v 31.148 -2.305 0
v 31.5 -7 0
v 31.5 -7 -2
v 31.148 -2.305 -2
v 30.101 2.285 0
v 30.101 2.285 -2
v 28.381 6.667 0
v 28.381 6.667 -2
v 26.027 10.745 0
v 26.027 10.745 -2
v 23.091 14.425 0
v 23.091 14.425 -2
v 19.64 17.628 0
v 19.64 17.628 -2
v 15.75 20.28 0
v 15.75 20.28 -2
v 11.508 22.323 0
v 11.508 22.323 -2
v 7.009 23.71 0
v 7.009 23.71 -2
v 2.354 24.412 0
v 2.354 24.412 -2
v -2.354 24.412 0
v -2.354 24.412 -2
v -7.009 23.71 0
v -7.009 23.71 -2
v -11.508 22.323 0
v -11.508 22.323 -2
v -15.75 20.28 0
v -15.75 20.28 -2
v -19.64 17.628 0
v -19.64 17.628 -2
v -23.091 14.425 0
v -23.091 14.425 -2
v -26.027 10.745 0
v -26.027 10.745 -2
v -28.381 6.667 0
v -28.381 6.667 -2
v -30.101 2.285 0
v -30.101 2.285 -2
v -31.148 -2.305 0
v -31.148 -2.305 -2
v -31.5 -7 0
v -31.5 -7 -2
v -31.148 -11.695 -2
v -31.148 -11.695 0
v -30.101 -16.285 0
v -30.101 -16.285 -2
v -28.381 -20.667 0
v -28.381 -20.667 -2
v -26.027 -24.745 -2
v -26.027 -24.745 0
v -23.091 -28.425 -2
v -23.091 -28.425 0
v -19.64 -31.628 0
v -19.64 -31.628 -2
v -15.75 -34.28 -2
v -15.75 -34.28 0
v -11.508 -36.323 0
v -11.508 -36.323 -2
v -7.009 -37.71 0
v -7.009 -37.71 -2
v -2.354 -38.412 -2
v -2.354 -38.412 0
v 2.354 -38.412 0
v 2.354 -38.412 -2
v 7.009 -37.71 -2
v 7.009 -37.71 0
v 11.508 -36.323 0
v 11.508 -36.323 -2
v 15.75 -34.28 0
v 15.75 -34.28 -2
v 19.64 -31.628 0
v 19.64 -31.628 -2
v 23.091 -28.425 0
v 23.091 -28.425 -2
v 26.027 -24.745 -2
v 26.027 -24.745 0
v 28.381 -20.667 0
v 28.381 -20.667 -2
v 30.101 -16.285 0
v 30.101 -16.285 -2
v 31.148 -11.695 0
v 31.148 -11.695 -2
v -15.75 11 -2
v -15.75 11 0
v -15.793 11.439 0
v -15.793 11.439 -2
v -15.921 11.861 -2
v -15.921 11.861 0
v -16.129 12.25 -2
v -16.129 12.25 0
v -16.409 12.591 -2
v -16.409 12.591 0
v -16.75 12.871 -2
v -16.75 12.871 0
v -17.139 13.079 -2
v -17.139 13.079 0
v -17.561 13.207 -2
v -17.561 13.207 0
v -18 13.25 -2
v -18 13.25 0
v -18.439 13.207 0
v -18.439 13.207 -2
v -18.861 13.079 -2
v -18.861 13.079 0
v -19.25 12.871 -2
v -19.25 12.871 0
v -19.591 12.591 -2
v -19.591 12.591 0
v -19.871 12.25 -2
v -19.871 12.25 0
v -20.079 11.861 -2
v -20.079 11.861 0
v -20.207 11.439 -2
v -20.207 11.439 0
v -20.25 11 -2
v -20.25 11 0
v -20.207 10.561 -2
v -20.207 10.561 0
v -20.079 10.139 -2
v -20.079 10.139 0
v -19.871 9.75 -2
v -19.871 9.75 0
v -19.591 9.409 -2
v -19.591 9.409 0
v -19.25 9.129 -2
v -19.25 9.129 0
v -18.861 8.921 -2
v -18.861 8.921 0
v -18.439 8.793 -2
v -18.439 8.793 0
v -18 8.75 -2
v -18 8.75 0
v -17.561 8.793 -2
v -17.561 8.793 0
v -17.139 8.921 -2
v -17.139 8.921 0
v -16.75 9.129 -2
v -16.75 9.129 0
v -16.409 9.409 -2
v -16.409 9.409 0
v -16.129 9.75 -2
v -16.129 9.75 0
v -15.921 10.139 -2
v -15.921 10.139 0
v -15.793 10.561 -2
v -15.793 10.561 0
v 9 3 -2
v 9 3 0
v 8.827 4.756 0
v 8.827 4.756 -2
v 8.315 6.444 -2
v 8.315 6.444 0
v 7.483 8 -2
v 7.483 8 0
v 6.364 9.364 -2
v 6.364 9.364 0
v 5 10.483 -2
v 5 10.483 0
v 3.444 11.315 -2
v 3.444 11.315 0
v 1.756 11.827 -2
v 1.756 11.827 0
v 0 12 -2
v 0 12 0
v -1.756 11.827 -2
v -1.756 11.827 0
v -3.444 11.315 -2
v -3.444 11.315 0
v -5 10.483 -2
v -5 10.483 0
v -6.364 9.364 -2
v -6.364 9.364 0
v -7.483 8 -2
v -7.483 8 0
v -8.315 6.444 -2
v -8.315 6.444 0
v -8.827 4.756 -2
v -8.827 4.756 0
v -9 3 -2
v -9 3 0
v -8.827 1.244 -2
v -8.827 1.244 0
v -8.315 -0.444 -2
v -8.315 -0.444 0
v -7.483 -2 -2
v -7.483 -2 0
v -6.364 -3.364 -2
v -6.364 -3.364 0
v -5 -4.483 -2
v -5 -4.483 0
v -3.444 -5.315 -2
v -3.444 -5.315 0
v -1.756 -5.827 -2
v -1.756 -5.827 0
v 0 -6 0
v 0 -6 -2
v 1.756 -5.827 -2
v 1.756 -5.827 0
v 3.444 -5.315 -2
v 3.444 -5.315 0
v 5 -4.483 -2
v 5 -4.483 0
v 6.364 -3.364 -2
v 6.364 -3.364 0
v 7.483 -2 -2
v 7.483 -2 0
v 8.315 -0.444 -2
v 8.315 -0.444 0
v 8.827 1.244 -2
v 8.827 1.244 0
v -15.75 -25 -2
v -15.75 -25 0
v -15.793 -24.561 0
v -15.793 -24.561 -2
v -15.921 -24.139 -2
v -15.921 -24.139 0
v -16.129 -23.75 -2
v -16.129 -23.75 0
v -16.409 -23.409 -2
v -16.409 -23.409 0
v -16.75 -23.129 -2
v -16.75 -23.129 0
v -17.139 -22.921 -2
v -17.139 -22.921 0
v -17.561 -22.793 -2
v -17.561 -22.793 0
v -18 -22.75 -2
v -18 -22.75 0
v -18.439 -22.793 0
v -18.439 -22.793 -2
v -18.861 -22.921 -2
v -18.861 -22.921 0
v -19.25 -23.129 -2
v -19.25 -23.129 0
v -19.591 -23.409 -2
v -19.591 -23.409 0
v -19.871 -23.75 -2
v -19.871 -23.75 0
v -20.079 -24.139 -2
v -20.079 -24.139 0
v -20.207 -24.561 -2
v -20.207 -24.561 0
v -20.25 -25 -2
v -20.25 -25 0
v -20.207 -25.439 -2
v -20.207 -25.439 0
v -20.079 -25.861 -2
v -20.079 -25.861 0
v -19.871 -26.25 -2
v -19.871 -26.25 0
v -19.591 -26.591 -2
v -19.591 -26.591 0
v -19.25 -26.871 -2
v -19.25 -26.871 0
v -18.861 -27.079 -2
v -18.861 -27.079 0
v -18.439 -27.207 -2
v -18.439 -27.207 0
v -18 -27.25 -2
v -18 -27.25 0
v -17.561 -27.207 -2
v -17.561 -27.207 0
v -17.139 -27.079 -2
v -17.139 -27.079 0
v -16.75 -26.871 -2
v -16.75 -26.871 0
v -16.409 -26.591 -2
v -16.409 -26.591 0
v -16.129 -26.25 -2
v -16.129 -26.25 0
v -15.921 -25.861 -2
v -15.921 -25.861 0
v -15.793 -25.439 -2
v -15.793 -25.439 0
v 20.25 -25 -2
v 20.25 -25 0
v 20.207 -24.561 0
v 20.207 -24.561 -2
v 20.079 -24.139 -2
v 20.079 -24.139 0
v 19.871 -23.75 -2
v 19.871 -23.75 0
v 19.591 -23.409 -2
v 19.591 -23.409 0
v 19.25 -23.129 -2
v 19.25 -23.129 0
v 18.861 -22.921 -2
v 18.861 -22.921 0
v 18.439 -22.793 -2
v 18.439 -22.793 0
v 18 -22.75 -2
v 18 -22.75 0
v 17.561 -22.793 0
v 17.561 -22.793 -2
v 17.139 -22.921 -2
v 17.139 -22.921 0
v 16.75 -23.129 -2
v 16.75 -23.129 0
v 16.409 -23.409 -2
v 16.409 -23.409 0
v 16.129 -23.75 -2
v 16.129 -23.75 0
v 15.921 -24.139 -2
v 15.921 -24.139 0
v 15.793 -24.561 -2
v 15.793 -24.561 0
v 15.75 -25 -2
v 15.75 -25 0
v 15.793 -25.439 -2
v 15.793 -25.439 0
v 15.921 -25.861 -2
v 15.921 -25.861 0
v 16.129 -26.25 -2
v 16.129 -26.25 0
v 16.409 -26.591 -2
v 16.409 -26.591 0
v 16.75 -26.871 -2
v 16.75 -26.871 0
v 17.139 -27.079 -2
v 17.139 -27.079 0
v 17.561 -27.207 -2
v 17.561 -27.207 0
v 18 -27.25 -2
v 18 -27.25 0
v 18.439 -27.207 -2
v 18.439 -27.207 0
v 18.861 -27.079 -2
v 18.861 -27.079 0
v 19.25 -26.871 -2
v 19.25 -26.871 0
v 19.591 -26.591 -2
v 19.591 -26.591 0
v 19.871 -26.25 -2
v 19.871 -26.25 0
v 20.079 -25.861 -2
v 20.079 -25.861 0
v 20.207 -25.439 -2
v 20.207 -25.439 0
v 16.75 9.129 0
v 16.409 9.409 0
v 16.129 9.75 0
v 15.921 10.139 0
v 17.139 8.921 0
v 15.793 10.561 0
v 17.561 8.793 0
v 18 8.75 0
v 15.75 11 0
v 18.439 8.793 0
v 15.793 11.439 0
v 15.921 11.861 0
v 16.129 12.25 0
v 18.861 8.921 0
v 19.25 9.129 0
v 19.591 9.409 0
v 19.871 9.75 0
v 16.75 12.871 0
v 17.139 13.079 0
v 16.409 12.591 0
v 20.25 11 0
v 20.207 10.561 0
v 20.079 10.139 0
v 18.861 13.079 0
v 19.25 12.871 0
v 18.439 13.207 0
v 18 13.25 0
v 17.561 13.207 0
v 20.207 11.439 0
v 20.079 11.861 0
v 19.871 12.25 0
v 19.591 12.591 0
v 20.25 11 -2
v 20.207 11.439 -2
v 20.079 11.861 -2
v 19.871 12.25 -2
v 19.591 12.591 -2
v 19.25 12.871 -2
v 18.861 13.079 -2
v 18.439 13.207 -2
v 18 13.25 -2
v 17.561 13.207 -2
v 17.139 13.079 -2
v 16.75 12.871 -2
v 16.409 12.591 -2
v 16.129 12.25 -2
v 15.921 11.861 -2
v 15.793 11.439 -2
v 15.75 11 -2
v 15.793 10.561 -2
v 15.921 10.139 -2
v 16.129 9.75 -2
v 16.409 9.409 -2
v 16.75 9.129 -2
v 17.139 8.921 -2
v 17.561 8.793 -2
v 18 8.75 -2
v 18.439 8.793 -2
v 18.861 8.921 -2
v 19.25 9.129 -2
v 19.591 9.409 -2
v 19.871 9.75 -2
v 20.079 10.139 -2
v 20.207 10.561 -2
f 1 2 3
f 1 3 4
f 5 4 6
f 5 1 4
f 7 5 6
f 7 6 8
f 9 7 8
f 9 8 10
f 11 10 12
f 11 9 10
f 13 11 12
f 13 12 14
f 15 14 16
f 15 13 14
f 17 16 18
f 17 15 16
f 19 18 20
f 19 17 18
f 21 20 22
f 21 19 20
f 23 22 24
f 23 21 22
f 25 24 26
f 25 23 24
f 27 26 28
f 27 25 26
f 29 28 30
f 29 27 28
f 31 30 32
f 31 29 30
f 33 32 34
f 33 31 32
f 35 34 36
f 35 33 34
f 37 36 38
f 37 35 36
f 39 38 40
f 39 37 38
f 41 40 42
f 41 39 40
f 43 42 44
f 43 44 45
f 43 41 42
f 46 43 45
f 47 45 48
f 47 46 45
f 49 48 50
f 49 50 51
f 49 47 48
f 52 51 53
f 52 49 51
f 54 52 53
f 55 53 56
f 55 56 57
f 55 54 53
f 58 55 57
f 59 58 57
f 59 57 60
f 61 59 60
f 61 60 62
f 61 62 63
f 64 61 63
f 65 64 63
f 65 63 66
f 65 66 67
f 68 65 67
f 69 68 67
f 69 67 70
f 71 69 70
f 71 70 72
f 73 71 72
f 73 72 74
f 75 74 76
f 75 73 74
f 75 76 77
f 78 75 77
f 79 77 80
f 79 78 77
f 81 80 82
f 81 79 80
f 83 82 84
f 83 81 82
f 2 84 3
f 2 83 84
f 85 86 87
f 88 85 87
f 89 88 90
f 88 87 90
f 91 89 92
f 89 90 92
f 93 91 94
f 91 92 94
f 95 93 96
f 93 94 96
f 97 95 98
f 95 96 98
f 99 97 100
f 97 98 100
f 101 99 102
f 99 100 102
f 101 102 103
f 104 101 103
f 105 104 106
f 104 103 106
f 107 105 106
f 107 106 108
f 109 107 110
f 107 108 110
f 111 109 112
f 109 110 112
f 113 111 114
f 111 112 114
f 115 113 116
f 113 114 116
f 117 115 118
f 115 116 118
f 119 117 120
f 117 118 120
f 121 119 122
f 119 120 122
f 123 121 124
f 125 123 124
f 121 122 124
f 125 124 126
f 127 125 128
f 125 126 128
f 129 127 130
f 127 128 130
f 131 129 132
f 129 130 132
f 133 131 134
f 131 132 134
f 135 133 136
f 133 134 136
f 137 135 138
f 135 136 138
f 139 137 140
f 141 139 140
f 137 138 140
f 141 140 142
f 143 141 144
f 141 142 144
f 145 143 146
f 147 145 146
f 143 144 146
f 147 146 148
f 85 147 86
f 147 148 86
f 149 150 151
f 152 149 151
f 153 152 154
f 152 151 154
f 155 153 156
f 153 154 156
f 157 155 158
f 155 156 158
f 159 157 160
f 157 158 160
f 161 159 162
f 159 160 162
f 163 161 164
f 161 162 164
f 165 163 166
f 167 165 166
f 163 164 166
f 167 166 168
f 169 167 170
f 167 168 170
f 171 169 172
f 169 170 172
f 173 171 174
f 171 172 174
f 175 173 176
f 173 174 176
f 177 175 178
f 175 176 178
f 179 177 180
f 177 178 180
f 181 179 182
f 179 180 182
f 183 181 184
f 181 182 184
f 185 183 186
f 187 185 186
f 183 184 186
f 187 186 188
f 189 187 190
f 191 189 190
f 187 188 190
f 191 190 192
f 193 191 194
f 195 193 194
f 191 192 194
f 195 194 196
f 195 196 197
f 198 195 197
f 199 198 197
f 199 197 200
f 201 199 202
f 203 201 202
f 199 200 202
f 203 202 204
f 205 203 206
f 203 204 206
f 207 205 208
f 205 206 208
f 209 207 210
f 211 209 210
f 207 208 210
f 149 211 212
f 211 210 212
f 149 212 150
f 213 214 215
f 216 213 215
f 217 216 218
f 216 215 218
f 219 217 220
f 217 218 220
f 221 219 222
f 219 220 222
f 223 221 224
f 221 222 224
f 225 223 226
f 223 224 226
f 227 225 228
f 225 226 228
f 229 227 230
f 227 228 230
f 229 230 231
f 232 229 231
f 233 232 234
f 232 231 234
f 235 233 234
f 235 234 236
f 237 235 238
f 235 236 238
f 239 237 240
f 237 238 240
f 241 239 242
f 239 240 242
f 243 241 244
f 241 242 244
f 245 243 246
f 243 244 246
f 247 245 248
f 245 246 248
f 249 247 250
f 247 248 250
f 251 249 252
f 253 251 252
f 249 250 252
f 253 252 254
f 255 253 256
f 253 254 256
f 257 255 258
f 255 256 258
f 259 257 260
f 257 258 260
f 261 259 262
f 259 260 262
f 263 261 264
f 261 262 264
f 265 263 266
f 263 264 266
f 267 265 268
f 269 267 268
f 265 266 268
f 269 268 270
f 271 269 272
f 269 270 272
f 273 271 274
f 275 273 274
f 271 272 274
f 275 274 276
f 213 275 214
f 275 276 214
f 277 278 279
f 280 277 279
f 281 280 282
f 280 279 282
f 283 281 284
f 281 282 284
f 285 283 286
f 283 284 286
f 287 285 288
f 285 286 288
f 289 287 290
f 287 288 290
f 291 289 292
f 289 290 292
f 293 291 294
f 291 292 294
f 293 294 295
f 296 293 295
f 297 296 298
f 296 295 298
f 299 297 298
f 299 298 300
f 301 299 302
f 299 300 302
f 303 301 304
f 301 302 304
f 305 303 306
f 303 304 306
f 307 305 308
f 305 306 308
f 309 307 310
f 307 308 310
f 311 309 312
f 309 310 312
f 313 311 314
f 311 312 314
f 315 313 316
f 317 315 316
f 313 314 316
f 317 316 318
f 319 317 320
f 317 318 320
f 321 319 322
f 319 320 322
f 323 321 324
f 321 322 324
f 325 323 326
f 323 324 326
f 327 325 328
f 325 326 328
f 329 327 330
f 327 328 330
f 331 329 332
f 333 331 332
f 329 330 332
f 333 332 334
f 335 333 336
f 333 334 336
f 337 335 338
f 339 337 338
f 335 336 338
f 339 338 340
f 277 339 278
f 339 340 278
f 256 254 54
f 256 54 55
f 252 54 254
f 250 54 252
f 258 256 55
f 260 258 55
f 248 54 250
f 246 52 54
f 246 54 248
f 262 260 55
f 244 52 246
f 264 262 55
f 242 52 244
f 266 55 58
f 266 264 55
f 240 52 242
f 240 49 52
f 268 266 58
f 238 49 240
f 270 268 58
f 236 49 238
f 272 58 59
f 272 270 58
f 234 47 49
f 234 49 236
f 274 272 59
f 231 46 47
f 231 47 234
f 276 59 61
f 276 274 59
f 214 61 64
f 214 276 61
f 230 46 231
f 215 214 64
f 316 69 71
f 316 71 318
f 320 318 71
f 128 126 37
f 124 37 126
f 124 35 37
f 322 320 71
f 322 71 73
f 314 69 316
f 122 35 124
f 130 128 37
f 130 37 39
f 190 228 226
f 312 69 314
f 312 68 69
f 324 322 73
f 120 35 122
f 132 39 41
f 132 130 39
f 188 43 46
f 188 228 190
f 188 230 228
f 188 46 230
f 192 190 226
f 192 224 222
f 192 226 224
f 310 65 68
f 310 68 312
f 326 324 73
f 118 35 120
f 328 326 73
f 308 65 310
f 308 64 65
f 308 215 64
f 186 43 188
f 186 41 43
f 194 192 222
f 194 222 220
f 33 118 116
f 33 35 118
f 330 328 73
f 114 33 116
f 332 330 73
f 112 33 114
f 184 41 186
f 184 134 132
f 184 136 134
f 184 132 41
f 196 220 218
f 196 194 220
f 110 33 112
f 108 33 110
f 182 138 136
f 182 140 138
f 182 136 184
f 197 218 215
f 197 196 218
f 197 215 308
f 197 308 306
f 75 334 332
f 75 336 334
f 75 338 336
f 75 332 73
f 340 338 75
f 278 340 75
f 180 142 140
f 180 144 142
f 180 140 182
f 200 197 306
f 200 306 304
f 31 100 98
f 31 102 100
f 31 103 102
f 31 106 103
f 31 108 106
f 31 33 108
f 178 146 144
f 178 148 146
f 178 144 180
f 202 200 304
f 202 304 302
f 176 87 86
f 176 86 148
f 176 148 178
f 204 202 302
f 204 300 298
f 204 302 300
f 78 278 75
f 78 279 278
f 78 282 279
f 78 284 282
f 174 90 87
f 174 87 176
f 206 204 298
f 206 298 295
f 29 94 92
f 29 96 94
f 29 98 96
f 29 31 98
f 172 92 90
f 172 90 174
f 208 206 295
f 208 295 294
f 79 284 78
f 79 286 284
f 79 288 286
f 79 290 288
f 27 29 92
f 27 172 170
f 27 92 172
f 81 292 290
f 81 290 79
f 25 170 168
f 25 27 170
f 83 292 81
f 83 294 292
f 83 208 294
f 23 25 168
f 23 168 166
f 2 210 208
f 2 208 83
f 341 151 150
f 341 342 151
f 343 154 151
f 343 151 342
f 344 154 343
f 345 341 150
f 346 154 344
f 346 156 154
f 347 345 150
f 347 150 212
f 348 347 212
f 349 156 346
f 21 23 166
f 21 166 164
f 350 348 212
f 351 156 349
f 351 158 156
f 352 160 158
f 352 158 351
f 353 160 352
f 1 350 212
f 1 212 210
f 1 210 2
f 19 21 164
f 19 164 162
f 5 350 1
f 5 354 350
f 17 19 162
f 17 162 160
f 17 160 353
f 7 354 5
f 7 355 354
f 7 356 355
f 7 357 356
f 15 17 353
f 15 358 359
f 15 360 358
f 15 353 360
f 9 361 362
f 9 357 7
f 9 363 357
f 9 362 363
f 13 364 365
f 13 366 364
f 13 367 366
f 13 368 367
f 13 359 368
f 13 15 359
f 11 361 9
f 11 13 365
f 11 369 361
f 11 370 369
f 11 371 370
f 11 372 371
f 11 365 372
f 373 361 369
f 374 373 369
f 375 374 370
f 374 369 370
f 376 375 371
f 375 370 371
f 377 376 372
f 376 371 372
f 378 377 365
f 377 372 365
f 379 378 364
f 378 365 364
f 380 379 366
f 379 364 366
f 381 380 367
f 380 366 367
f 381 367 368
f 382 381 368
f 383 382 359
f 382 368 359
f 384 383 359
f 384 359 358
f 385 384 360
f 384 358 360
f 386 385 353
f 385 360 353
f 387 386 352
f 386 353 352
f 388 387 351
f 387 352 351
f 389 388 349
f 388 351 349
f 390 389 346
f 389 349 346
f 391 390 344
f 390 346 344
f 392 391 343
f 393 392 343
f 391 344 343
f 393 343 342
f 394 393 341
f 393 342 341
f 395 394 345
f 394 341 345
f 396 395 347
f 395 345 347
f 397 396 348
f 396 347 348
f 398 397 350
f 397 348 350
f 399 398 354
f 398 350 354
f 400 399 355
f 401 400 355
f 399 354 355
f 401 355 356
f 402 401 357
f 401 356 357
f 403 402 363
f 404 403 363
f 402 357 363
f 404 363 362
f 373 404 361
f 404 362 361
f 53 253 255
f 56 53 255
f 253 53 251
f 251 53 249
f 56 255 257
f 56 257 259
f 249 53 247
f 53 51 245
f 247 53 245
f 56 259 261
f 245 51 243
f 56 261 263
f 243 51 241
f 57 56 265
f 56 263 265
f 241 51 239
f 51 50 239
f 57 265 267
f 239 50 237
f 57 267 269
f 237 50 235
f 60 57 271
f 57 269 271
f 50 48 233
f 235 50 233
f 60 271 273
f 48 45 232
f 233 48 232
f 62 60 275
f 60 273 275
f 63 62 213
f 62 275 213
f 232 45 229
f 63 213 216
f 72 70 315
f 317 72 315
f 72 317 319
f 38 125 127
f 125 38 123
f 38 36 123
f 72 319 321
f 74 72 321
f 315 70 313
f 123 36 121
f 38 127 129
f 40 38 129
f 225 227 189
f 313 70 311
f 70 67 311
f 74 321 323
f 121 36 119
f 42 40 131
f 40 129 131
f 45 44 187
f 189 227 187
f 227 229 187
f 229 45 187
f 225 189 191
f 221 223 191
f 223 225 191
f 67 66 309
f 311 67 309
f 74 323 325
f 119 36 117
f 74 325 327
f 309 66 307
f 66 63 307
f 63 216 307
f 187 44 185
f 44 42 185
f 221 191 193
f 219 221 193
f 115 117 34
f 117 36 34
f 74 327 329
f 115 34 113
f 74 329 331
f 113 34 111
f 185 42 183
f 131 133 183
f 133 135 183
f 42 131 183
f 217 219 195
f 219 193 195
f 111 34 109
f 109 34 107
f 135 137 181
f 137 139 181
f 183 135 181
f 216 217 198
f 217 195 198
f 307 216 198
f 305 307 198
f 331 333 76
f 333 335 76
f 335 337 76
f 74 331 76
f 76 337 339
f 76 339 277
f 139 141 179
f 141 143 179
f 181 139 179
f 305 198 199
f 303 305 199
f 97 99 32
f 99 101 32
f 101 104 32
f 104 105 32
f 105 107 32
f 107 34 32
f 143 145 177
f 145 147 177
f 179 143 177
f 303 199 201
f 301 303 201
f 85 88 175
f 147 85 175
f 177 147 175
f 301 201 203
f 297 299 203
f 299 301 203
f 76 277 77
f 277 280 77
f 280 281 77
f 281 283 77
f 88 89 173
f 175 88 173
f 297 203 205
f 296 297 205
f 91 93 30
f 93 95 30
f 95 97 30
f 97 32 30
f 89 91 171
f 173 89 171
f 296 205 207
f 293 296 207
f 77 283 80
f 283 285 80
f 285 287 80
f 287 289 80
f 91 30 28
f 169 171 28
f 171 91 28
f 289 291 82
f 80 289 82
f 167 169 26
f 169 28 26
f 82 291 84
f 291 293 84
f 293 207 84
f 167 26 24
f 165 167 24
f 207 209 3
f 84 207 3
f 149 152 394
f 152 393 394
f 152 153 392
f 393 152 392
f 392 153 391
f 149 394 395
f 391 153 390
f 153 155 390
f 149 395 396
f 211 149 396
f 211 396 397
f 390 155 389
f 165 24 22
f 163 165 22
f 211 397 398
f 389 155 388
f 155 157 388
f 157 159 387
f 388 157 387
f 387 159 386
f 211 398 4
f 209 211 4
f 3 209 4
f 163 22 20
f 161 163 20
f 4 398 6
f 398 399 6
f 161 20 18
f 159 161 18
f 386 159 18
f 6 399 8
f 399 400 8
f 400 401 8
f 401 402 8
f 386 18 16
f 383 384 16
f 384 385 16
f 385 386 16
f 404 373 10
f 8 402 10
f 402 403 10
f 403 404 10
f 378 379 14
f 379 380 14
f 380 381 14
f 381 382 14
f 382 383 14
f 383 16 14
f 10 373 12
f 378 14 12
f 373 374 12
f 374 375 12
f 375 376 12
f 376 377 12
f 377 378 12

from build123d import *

# Parameters (mm, degrees)
F0_R     = 31.5
F0_R_2   = 2.25
F0_R_3   = 11.5
F0_R_4   = 9
F1_DEPTH = 2


with BuildPart() as f1:
    # F0 (on Top) → F1 (new body)
    with BuildSketch(Plane.XY):
        with Locations((0, -7)):
            Circle(F0_R)
        with Locations((-18, -25)):
            Circle(F0_R_2, mode=Mode.SUBTRACT)
        with Locations((18, -25)):
            Circle(F0_R_2, mode=Mode.SUBTRACT)
        with Locations((-18, 11)):
            Circle(F0_R_2, mode=Mode.SUBTRACT)
        with Locations((0, 3)):
            Circle(F0_R_3, mode=Mode.SUBTRACT)
        with Locations((18, 11)):
            Circle(F0_R_2, mode=Mode.SUBTRACT)
        with Locations((0, 3)):
            Circle(F0_R_3)
        with Locations((0, 3)):
            Circle(F0_R_4, mode=Mode.SUBTRACT)
    extrude(amount=-F1_DEPTH)


solid = f1.part
